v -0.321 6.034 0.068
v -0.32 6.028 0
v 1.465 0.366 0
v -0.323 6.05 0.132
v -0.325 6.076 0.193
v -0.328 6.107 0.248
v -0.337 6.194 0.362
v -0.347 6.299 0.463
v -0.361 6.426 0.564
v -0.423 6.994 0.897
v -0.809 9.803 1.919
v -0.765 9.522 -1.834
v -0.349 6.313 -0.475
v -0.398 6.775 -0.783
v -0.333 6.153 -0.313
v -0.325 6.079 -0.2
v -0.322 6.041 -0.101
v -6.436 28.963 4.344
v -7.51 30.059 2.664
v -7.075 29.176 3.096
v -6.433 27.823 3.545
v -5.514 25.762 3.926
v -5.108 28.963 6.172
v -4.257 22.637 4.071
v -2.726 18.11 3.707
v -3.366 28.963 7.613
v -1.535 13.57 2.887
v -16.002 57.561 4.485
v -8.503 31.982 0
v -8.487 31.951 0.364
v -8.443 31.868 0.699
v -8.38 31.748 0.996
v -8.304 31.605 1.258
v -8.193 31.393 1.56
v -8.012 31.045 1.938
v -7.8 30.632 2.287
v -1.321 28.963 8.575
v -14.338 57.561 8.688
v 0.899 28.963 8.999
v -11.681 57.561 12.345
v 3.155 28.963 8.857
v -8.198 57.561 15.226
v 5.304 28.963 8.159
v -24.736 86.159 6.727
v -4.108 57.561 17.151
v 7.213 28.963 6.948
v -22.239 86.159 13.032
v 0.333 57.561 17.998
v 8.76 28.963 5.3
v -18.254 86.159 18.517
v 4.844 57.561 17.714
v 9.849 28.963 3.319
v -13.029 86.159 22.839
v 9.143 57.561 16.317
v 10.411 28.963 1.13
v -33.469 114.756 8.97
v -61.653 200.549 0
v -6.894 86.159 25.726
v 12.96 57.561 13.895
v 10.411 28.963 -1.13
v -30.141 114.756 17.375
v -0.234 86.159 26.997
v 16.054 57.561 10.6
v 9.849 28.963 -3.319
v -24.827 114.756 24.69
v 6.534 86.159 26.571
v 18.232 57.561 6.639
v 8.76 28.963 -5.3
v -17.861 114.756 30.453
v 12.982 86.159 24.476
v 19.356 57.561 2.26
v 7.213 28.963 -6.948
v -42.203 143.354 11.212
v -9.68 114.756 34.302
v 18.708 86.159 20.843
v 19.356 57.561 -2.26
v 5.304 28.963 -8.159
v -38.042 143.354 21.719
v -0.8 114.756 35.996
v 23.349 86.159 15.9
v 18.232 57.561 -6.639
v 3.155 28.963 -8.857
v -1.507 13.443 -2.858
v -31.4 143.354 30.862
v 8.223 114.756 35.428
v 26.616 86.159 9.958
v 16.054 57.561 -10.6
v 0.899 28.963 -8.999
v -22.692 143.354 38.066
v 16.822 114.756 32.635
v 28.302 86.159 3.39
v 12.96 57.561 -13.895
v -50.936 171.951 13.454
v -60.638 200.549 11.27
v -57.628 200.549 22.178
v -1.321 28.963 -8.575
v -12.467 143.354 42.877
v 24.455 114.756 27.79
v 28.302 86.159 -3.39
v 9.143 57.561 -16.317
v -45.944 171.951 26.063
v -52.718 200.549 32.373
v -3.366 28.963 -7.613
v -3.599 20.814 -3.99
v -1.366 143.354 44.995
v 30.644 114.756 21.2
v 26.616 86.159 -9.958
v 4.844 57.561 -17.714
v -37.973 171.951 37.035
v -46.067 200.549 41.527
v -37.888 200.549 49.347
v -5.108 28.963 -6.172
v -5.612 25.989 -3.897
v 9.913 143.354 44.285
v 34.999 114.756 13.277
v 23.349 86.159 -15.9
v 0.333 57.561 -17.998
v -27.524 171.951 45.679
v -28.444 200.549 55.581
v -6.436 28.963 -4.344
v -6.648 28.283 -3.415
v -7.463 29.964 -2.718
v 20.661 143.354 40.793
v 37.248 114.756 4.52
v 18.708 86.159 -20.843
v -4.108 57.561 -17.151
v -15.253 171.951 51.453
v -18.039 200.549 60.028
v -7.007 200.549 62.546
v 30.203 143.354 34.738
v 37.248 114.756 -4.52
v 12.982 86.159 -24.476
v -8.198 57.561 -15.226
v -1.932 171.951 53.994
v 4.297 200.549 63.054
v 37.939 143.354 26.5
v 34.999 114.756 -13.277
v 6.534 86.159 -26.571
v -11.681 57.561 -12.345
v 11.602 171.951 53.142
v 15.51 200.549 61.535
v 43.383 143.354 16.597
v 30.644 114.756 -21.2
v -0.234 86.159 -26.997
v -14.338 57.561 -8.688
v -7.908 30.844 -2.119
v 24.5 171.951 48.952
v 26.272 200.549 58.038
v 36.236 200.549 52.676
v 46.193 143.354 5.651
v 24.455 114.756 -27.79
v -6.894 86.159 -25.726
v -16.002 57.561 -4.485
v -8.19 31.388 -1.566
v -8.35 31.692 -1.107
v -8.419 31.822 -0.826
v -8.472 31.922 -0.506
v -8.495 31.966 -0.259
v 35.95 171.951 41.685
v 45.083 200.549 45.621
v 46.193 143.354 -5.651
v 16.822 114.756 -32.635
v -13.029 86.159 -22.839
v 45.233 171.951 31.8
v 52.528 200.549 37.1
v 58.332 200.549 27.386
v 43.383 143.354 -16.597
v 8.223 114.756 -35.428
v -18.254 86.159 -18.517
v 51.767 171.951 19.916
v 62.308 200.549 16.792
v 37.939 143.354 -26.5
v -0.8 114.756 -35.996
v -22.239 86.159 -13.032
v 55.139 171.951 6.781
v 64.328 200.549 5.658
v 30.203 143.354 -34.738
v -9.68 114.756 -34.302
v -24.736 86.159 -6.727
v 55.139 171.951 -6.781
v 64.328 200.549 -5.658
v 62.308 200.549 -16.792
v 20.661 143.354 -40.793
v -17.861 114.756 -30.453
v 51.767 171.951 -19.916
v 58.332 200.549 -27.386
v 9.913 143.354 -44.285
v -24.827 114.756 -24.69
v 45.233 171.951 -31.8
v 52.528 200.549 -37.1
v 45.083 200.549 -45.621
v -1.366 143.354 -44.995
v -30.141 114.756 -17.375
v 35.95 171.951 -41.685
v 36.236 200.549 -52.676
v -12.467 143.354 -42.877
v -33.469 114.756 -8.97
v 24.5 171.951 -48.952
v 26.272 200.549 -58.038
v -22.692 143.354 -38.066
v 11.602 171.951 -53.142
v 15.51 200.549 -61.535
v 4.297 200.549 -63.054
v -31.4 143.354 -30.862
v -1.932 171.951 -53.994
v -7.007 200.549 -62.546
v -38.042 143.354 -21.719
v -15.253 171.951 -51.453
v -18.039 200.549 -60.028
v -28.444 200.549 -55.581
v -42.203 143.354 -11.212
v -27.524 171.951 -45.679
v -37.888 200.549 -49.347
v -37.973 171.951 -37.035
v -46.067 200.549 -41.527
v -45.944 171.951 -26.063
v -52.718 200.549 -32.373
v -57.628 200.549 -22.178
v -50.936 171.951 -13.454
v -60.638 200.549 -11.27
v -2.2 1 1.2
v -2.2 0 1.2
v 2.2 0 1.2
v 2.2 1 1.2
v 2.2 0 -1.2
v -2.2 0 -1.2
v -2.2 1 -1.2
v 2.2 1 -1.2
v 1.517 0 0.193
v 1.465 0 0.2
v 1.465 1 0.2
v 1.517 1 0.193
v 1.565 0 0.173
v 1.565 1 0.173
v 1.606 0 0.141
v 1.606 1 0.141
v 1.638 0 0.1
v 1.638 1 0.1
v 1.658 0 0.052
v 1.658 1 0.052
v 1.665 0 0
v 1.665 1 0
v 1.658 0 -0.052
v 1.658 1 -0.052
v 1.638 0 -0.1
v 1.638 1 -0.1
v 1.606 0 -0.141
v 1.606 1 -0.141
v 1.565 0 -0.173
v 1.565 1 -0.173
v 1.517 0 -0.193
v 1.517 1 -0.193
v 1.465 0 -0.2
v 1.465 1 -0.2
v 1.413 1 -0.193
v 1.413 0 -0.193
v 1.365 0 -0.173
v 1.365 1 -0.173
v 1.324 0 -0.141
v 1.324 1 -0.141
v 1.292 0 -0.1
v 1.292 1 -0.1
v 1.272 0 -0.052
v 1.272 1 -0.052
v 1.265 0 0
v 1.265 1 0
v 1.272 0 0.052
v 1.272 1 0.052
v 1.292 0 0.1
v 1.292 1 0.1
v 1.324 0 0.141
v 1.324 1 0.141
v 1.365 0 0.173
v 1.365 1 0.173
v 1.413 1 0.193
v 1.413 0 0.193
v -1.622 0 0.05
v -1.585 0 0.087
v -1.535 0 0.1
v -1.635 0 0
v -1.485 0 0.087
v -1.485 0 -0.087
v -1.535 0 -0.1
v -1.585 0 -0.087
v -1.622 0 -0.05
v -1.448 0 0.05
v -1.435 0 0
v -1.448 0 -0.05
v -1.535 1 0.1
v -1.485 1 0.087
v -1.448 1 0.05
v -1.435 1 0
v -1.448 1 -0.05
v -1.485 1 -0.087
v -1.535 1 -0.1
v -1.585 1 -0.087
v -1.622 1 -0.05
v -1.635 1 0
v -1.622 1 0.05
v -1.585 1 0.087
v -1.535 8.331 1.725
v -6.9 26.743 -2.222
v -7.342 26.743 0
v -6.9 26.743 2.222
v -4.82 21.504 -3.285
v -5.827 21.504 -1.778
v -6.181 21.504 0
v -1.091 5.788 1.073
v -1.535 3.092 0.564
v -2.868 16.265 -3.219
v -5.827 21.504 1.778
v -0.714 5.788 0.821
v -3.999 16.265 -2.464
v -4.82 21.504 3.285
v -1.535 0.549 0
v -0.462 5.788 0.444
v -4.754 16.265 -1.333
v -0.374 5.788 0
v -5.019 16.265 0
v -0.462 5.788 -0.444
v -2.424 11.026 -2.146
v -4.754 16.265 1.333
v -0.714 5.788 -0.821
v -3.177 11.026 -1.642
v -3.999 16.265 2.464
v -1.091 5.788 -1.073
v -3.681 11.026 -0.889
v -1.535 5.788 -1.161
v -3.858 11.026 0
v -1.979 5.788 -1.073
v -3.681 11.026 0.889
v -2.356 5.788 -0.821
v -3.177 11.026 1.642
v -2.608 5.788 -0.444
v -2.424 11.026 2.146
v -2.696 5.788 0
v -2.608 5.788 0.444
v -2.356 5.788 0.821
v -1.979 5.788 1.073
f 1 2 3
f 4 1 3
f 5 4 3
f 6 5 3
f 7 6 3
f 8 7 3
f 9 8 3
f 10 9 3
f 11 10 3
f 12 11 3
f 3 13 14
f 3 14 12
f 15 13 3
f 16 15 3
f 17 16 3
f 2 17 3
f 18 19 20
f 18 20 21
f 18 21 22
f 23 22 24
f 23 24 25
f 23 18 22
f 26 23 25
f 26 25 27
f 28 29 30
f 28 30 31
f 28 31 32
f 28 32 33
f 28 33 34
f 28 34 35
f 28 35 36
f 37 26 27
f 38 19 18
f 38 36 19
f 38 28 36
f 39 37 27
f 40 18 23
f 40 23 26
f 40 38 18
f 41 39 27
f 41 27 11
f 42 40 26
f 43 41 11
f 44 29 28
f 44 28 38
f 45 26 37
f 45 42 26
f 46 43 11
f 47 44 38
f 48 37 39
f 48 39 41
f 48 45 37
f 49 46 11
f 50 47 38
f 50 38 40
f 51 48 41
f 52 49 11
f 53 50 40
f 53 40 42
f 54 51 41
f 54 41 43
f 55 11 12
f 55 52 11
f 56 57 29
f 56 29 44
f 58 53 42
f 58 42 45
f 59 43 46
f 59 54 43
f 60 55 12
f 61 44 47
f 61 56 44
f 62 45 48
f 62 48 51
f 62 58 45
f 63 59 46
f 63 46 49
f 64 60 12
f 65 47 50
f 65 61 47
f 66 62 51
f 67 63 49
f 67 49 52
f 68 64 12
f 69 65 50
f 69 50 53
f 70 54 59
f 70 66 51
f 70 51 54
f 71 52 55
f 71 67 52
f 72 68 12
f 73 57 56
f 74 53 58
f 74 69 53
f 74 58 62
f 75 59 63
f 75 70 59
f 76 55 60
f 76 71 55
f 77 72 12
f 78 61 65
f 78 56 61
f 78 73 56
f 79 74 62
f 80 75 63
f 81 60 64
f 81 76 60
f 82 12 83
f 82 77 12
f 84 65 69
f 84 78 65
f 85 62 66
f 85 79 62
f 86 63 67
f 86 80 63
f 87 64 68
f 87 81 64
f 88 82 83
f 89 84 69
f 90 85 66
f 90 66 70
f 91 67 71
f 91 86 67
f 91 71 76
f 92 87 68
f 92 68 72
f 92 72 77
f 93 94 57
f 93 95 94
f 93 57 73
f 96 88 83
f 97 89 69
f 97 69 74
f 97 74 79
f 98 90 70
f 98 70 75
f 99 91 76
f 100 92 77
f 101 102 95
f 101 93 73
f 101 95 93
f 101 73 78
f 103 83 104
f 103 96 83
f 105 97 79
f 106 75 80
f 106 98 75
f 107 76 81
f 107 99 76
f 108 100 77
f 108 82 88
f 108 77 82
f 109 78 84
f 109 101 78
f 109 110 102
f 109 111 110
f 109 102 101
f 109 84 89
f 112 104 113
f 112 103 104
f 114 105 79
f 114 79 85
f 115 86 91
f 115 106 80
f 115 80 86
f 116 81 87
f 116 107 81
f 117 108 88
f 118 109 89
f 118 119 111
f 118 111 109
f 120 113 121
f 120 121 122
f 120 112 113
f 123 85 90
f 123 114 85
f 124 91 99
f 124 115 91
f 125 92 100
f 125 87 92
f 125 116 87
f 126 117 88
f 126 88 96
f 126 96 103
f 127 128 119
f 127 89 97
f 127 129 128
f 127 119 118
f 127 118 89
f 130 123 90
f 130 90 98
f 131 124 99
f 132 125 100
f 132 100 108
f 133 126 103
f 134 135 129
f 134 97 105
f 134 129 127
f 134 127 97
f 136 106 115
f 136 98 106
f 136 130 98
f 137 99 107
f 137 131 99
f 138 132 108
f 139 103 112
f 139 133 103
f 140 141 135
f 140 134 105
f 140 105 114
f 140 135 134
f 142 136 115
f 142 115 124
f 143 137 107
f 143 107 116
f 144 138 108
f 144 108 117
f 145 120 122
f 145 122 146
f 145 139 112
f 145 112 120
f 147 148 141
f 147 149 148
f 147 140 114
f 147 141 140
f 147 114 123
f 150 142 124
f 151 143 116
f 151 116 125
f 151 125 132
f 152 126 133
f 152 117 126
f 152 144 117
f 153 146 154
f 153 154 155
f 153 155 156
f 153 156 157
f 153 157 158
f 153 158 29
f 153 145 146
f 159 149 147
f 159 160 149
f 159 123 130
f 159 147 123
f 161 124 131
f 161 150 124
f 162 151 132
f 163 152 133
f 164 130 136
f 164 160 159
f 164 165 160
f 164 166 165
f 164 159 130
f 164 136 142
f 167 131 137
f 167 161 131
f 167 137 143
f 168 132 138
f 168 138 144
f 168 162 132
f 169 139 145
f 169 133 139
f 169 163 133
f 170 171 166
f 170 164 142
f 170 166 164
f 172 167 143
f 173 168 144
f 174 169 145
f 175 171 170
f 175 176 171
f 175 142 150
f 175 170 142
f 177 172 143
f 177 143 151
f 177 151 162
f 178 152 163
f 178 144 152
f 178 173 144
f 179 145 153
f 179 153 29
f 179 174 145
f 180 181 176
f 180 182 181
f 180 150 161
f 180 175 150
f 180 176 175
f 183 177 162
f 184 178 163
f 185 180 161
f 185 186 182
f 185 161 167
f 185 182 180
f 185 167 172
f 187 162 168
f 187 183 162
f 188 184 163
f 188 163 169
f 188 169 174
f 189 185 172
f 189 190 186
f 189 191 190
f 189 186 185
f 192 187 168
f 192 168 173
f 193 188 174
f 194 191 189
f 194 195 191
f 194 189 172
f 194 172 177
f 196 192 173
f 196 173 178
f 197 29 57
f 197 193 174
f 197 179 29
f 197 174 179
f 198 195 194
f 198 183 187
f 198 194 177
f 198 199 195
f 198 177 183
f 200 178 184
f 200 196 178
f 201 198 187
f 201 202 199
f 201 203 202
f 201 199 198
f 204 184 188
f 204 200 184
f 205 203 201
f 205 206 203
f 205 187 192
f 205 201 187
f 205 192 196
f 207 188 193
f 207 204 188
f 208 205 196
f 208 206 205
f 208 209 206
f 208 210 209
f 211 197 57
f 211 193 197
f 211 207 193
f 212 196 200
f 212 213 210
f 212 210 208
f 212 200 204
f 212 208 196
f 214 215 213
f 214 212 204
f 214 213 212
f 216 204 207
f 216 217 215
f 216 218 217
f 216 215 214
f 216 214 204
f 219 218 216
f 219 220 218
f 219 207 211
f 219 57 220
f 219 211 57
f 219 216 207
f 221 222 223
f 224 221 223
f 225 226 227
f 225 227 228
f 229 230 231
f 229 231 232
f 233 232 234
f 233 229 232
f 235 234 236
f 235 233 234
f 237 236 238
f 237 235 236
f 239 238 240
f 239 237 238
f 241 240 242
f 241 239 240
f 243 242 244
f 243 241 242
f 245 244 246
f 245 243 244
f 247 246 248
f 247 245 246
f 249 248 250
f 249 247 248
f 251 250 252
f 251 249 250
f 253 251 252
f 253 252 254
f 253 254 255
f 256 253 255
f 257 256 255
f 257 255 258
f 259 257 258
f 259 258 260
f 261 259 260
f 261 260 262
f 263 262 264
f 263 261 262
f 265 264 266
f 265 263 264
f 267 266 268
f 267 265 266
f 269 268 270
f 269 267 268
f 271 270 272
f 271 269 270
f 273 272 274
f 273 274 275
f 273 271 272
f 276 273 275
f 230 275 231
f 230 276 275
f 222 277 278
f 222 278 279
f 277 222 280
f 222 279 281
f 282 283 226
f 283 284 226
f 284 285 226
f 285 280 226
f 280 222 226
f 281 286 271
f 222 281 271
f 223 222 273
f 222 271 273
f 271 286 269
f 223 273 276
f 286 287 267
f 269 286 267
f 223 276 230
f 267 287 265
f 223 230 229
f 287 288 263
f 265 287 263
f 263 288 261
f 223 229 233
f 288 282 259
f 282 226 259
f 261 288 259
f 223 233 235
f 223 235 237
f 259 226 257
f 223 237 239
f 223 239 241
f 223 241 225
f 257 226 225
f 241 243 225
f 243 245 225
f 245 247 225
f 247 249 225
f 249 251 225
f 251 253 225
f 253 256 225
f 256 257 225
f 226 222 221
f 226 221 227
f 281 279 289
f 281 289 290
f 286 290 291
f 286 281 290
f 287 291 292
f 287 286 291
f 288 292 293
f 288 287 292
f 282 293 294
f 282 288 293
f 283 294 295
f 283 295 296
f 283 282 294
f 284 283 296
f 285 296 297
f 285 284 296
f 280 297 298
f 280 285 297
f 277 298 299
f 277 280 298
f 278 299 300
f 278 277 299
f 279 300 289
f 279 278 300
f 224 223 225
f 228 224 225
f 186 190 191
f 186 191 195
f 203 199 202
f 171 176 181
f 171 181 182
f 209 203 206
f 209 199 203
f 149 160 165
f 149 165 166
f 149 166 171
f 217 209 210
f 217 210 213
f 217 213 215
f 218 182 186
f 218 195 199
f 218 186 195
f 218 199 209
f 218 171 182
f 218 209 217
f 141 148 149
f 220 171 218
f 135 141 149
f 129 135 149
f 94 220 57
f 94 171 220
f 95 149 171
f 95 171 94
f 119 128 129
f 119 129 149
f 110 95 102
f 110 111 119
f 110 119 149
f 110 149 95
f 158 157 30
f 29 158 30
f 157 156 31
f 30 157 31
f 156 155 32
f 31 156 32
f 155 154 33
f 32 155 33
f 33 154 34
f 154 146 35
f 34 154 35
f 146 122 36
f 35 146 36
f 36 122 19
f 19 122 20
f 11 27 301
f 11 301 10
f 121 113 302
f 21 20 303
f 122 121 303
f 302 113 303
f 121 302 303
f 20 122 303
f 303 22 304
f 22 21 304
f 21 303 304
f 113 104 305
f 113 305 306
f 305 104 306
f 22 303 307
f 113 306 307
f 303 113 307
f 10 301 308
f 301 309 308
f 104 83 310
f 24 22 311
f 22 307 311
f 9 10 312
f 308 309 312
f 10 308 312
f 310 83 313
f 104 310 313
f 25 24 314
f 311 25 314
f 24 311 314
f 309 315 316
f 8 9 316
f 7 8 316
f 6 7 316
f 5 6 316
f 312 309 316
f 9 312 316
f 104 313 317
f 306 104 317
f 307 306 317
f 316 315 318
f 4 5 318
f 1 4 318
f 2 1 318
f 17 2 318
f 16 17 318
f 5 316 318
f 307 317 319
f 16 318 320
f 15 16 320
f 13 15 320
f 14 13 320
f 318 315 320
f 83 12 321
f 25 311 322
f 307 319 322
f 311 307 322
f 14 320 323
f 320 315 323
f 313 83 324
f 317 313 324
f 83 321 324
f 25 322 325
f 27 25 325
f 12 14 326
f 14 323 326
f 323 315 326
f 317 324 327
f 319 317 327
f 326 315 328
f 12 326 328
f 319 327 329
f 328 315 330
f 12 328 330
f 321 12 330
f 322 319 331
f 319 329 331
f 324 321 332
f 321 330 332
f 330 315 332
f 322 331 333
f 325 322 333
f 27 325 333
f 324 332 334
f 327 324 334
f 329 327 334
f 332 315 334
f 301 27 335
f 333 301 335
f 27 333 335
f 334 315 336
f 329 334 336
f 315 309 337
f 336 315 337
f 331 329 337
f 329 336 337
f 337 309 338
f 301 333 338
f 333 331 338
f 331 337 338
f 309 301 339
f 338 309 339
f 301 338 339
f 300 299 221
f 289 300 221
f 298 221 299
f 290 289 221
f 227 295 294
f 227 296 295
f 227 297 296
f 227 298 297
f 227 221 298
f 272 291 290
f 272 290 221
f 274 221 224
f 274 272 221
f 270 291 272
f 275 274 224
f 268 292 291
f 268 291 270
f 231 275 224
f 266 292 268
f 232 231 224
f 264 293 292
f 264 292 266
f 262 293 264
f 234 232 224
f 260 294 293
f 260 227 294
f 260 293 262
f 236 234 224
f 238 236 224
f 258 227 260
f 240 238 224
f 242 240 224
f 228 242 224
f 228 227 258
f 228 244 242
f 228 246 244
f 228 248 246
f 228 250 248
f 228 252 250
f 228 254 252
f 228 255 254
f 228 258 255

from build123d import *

# Parameters (mm, degrees)
SKETCH2_W           = 4.4
SKETCH2_H           = 2.4
SKETCH2_R           = 0.2
SKETCH2_R_2         = 0.1
BOSS_EXTRUDE1_DEPTH = 1


with BuildPart() as part:
    # Sketch2 → Boss-Extrude1 (new body)
    with BuildSketch(Plane(origin=(0, 0, 0), x_dir=(1, 0, 0), z_dir=(0, 1, 0))):
        Rectangle(SKETCH2_W, SKETCH2_H)
        with Locations(Location((1.465, 0, 0), (0, 0, 270))):
            Circle(SKETCH2_R, mode=Mode.SUBTRACT)
        with Locations(Location((-1.535, 0, 0), (0, 0, 270))):
            Circle(SKETCH2_R_2, mode=Mode.SUBTRACT)
    extrude(amount=BOSS_EXTRUDE1_DEPTH)


with BuildPart() as body_2:
    # Sketch3 → Revolve1 (revolve)
    with BuildSketch(Plane.XY, mode=Mode.PRIVATE) as revolve1_sk:
        Polygon((-1.535, 0.54892915), (-1.535, 200.54892915), (42.803932529, 200.54892915), align=None)
    revolve(revolve1_sk.sketch.rotate(Axis((-1.535, 0.54892915, 0), (0, 1, 0)), 270), axis=Axis((-1.535, 0.54892915, 0), (0, 1, 0)))

    # Sketch4 → Revolve2 (revolve)
    with BuildSketch(Plane.XY, mode=Mode.PRIVATE) as revolve2_sk:
        Polygon((1.465, 0.36568104), (64.582535683, 200.54892915), (1.465, 200.54892915), align=None)
    revolve(revolve2_sk.sketch.rotate(Axis((1.465, 0.36568104, 0), (0, 1, 0)), 180), axis=Axis((1.465, 0.36568104, 0), (0, 1, 0)))


solid = Compound([part.part, body_2.part])
